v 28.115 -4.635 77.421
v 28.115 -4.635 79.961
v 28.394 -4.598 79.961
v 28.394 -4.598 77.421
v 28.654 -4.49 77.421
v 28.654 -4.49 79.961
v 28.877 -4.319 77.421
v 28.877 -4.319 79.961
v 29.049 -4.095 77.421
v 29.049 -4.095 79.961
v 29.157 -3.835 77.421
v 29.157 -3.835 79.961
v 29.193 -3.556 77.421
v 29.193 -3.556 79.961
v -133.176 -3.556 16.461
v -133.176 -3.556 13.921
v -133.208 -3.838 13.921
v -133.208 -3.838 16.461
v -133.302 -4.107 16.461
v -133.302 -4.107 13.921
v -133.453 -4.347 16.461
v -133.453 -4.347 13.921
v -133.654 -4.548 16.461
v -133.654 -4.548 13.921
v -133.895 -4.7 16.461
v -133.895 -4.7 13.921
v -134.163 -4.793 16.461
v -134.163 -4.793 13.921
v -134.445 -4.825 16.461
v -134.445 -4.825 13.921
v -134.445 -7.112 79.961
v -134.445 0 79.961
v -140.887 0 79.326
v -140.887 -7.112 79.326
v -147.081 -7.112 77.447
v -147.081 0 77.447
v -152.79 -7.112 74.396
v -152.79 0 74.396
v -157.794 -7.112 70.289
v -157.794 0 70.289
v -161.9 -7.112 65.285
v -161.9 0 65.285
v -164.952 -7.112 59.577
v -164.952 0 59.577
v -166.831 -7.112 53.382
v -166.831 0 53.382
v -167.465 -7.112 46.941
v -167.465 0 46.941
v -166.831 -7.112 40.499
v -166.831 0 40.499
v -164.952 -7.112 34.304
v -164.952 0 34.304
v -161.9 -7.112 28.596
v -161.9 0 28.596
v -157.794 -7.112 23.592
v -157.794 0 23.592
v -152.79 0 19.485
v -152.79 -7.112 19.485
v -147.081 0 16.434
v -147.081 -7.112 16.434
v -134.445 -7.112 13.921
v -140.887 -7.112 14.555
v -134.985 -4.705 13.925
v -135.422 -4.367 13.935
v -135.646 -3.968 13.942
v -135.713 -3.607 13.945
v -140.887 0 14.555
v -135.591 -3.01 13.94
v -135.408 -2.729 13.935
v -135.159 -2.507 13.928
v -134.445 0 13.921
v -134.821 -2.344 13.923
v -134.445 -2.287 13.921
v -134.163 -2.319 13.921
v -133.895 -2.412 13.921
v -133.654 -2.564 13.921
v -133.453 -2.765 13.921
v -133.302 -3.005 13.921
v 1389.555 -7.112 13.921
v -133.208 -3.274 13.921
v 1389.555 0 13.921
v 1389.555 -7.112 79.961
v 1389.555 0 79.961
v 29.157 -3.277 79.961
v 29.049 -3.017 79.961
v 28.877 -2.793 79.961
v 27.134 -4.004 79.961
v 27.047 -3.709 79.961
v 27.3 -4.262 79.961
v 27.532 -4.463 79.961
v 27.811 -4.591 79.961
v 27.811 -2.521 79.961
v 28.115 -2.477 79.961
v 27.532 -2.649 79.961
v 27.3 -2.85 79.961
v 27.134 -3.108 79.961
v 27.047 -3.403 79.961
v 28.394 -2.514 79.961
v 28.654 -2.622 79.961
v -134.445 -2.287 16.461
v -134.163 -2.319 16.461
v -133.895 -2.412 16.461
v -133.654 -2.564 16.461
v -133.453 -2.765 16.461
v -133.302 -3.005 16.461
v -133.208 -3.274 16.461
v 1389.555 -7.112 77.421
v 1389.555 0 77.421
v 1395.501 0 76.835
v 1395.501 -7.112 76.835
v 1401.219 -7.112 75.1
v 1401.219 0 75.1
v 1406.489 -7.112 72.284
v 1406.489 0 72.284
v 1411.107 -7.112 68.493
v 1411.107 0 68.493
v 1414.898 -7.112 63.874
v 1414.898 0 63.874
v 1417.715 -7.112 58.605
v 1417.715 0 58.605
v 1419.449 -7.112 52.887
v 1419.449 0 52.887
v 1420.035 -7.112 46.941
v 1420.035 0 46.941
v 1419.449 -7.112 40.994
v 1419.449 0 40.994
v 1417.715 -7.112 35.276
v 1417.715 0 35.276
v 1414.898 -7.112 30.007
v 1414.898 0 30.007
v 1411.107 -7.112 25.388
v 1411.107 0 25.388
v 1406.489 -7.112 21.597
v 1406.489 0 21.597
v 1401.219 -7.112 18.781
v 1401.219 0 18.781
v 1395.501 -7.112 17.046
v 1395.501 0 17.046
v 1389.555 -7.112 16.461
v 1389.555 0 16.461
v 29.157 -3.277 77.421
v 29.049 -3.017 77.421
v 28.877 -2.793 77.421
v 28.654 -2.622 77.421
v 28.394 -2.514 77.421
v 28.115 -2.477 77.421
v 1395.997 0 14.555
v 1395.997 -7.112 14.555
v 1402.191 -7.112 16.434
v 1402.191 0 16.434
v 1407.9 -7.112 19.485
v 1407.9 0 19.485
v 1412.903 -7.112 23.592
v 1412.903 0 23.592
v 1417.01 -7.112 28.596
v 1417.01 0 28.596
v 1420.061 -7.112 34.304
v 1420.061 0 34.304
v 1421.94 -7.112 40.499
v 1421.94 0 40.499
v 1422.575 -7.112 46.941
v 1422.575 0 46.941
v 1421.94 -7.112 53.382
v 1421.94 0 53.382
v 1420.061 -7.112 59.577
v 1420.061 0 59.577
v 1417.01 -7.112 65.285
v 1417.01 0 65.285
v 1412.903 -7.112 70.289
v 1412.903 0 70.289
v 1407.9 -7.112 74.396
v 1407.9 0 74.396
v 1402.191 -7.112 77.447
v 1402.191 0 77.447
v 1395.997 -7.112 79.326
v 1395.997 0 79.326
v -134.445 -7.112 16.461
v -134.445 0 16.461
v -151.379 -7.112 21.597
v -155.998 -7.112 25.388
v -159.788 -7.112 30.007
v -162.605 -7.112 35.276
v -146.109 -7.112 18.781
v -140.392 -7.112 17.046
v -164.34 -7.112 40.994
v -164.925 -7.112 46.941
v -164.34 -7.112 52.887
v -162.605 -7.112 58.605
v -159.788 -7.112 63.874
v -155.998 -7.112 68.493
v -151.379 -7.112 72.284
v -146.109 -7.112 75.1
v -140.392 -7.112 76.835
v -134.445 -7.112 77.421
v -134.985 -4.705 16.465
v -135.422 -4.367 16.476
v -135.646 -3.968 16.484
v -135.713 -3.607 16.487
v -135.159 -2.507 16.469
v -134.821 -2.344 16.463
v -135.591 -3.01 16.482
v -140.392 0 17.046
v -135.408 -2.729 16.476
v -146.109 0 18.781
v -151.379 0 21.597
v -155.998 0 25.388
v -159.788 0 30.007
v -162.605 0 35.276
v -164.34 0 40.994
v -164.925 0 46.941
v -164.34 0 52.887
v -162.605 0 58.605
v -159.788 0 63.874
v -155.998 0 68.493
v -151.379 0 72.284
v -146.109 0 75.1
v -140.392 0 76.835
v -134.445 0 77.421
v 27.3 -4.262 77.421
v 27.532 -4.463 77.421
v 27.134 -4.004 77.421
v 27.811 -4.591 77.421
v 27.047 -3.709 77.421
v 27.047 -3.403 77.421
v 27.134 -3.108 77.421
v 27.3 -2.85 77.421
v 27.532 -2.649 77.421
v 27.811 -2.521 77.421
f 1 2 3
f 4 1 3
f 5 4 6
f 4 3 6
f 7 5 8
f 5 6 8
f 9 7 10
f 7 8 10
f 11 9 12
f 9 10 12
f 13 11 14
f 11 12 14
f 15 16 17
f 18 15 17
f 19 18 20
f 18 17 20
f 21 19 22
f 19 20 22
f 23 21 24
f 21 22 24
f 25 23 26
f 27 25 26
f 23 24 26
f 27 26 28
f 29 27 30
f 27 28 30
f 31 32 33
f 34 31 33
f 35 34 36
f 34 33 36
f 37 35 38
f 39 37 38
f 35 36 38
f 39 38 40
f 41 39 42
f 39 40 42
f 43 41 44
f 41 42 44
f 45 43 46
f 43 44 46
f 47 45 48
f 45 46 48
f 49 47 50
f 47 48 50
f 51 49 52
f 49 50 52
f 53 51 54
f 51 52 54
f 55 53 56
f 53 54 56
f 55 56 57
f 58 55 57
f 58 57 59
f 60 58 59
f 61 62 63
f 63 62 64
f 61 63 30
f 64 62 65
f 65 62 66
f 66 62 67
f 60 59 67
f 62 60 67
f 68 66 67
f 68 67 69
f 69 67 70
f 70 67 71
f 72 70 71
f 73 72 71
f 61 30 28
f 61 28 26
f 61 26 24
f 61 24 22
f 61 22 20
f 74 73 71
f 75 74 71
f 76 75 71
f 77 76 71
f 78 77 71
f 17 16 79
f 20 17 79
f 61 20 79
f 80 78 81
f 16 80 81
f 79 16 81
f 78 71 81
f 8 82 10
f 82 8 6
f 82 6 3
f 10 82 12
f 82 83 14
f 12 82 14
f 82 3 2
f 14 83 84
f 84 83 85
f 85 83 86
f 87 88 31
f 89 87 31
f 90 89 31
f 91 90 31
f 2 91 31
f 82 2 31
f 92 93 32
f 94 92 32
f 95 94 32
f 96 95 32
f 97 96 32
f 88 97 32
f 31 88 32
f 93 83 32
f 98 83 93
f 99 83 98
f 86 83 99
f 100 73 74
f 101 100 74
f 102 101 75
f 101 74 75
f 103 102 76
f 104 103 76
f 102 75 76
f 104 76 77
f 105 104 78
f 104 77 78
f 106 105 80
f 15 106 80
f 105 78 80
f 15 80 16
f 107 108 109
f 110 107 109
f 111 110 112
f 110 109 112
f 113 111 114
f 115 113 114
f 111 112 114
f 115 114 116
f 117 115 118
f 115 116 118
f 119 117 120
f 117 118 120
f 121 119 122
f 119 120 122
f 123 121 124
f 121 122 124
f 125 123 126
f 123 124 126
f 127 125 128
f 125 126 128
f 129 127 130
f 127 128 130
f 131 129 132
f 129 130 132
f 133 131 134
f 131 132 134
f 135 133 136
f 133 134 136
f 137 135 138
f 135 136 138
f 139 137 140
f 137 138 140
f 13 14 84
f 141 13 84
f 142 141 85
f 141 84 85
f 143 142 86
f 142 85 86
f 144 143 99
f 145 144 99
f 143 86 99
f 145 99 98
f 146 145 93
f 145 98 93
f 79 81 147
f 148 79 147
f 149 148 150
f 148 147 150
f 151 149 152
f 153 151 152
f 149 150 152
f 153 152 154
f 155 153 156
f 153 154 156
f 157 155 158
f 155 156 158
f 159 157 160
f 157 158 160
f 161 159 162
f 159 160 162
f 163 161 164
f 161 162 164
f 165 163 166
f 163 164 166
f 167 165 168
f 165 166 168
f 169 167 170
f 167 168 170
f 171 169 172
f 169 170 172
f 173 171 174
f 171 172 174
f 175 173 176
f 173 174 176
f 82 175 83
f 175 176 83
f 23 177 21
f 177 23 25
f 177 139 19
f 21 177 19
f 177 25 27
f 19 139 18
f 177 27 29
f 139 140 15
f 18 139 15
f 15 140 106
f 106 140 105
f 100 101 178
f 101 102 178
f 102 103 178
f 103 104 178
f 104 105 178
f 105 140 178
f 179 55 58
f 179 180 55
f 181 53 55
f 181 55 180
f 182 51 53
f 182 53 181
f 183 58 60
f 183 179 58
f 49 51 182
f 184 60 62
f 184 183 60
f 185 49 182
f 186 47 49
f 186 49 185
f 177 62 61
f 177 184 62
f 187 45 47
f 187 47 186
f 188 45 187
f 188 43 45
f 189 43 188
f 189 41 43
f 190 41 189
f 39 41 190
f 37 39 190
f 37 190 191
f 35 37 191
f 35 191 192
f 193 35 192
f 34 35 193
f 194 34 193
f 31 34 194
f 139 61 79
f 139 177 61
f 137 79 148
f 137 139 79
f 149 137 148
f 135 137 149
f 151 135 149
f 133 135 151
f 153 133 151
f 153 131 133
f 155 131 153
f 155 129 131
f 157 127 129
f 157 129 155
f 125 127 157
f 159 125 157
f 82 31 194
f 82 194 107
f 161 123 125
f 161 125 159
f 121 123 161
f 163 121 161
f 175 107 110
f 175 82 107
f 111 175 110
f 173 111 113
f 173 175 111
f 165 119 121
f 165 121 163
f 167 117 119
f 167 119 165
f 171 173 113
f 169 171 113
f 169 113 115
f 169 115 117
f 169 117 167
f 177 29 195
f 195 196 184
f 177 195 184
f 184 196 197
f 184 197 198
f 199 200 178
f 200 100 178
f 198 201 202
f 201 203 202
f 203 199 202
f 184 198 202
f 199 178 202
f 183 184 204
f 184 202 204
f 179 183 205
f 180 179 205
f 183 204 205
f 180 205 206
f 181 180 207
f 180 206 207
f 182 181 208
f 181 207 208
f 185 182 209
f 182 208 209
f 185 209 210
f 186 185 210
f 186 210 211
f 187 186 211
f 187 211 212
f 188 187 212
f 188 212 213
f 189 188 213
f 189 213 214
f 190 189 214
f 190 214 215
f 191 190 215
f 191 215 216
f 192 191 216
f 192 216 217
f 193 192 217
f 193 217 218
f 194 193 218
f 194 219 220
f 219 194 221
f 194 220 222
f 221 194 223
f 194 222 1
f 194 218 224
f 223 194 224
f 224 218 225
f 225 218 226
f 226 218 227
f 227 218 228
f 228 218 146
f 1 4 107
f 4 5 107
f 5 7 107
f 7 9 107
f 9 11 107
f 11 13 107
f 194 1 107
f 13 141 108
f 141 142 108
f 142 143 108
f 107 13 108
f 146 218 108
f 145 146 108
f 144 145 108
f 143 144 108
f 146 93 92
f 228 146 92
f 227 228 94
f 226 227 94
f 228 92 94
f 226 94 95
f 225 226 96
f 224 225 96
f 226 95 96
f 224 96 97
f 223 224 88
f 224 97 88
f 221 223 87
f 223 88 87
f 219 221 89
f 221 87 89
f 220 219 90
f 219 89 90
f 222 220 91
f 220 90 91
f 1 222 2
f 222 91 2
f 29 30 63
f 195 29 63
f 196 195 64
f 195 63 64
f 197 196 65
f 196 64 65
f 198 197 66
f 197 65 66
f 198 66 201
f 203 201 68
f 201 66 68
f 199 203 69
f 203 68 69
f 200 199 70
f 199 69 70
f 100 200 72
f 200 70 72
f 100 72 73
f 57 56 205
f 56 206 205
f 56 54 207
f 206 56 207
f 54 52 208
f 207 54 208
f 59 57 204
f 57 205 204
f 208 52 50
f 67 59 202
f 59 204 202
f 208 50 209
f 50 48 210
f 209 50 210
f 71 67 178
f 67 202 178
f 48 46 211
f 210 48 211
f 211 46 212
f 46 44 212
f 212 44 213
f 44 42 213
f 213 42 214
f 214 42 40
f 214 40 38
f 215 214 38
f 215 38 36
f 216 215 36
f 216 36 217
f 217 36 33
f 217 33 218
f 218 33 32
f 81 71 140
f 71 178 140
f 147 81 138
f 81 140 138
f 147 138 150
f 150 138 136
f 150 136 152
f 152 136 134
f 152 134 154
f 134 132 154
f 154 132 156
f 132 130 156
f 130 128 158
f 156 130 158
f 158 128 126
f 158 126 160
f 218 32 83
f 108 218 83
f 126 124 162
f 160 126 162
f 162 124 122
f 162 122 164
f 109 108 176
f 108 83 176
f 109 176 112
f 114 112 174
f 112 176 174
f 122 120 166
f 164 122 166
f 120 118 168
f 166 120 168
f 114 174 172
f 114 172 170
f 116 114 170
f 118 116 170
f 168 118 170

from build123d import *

# Parameters (mm, degrees)
F1_DEPTH = 7.112
F3_DEPTH = 25.4
F6_DEPTH = 25.4


with BuildPart() as f1:
    # F0 (on Front) → F1 (new body)
    with BuildSketch(Plane.XZ):
        with BuildLine():
            Line((-134.4452477908, 13.9205330778), (1389.5547522092, 13.9205330778))
            ThreePointArc((1389.5547522092, 13.9205330778), (1422.5747522092, 46.9405330778), (1389.5547522092, 79.9605330778))
            Line((1389.5547522092, 79.9605330778), (-134.4452477908, 79.9605330778))
            ThreePointArc((-134.4452477908, 79.9605330778), (-167.4652477908, 46.9405330778), (-134.4452477908, 13.9205330778))
        make_face()
        with BuildLine():
            ThreePointArc((-134.4452477908, 16.4605330778), (-164.9252477908, 46.9405330778), (-134.4452477908, 77.4205330778))
            Line((-134.4452477908, 77.4205330778), (1389.5547522092, 77.4205330778))
            ThreePointArc((1389.5547522092, 77.4205330778), (1420.0347522092, 46.9405330778), (1389.5547522092, 16.4605330778))
            Line((1389.5547522092, 16.4605330778), (-134.4452477908, 16.4605330778))
        make_face(mode=Mode.SUBTRACT)
    extrude(amount=F1_DEPTH)

    # F2 (on face) → F3 (cut)
    with BuildSketch(Plane.XY.offset(79.9605330778)):
        with BuildLine():
            Line((28.1147522092, -4.6345466567), (28.1147522092, -2.4774533433))
            ThreePointArc((28.1147522092, -2.4774533433), (27.0362055525, -3.556), (28.1147522092, -4.6345466567))
        make_face()
        with BuildLine():
            ThreePointArc((29.1932988659, -3.556), (28.877399864, -2.7933523452), (28.1147522092, -2.4774533433))
            Line((28.1147522092, -2.4774533433), (28.1147522092, -4.6345466567))
            ThreePointArc((28.1147522092, -4.6345466567), (28.877399864, -4.3186476548), (29.1932988659, -3.556))
        make_face()
    extrude(amount=-F3_DEPTH, mode=Mode.SUBTRACT)

    # F5 (on face) → F6 (cut)
    with BuildSketch(Plane(origin=(0, 0, 13.9205330778), x_dir=(1, 0, 0), z_dir=(0, 0, -1))):
        with BuildLine():
            ThreePointArc((-134.4452477908, 2.2867995466), (-133.5477875436, 2.6585397527), (-133.1760473375, 3.556))
            ThreePointArc((-133.1760473375, 3.556), (-133.5477875436, 4.4534602473), (-134.4452477908, 4.8252004534))
            Line((-134.4452477908, 4.8252004534), (-134.4452477908, 2.2867995466))
        make_face()
        with BuildLine():
            Line((-134.4452477908, 2.2867995466), (-134.4452477908, 4.8252004534))
            ThreePointArc((-134.4452477908, 4.8252004534), (-135.7144482442, 3.556), (-134.4452477908, 2.2867995466))
        make_face()
    extrude(amount=-F6_DEPTH, mode=Mode.SUBTRACT)


solid = f1.part
